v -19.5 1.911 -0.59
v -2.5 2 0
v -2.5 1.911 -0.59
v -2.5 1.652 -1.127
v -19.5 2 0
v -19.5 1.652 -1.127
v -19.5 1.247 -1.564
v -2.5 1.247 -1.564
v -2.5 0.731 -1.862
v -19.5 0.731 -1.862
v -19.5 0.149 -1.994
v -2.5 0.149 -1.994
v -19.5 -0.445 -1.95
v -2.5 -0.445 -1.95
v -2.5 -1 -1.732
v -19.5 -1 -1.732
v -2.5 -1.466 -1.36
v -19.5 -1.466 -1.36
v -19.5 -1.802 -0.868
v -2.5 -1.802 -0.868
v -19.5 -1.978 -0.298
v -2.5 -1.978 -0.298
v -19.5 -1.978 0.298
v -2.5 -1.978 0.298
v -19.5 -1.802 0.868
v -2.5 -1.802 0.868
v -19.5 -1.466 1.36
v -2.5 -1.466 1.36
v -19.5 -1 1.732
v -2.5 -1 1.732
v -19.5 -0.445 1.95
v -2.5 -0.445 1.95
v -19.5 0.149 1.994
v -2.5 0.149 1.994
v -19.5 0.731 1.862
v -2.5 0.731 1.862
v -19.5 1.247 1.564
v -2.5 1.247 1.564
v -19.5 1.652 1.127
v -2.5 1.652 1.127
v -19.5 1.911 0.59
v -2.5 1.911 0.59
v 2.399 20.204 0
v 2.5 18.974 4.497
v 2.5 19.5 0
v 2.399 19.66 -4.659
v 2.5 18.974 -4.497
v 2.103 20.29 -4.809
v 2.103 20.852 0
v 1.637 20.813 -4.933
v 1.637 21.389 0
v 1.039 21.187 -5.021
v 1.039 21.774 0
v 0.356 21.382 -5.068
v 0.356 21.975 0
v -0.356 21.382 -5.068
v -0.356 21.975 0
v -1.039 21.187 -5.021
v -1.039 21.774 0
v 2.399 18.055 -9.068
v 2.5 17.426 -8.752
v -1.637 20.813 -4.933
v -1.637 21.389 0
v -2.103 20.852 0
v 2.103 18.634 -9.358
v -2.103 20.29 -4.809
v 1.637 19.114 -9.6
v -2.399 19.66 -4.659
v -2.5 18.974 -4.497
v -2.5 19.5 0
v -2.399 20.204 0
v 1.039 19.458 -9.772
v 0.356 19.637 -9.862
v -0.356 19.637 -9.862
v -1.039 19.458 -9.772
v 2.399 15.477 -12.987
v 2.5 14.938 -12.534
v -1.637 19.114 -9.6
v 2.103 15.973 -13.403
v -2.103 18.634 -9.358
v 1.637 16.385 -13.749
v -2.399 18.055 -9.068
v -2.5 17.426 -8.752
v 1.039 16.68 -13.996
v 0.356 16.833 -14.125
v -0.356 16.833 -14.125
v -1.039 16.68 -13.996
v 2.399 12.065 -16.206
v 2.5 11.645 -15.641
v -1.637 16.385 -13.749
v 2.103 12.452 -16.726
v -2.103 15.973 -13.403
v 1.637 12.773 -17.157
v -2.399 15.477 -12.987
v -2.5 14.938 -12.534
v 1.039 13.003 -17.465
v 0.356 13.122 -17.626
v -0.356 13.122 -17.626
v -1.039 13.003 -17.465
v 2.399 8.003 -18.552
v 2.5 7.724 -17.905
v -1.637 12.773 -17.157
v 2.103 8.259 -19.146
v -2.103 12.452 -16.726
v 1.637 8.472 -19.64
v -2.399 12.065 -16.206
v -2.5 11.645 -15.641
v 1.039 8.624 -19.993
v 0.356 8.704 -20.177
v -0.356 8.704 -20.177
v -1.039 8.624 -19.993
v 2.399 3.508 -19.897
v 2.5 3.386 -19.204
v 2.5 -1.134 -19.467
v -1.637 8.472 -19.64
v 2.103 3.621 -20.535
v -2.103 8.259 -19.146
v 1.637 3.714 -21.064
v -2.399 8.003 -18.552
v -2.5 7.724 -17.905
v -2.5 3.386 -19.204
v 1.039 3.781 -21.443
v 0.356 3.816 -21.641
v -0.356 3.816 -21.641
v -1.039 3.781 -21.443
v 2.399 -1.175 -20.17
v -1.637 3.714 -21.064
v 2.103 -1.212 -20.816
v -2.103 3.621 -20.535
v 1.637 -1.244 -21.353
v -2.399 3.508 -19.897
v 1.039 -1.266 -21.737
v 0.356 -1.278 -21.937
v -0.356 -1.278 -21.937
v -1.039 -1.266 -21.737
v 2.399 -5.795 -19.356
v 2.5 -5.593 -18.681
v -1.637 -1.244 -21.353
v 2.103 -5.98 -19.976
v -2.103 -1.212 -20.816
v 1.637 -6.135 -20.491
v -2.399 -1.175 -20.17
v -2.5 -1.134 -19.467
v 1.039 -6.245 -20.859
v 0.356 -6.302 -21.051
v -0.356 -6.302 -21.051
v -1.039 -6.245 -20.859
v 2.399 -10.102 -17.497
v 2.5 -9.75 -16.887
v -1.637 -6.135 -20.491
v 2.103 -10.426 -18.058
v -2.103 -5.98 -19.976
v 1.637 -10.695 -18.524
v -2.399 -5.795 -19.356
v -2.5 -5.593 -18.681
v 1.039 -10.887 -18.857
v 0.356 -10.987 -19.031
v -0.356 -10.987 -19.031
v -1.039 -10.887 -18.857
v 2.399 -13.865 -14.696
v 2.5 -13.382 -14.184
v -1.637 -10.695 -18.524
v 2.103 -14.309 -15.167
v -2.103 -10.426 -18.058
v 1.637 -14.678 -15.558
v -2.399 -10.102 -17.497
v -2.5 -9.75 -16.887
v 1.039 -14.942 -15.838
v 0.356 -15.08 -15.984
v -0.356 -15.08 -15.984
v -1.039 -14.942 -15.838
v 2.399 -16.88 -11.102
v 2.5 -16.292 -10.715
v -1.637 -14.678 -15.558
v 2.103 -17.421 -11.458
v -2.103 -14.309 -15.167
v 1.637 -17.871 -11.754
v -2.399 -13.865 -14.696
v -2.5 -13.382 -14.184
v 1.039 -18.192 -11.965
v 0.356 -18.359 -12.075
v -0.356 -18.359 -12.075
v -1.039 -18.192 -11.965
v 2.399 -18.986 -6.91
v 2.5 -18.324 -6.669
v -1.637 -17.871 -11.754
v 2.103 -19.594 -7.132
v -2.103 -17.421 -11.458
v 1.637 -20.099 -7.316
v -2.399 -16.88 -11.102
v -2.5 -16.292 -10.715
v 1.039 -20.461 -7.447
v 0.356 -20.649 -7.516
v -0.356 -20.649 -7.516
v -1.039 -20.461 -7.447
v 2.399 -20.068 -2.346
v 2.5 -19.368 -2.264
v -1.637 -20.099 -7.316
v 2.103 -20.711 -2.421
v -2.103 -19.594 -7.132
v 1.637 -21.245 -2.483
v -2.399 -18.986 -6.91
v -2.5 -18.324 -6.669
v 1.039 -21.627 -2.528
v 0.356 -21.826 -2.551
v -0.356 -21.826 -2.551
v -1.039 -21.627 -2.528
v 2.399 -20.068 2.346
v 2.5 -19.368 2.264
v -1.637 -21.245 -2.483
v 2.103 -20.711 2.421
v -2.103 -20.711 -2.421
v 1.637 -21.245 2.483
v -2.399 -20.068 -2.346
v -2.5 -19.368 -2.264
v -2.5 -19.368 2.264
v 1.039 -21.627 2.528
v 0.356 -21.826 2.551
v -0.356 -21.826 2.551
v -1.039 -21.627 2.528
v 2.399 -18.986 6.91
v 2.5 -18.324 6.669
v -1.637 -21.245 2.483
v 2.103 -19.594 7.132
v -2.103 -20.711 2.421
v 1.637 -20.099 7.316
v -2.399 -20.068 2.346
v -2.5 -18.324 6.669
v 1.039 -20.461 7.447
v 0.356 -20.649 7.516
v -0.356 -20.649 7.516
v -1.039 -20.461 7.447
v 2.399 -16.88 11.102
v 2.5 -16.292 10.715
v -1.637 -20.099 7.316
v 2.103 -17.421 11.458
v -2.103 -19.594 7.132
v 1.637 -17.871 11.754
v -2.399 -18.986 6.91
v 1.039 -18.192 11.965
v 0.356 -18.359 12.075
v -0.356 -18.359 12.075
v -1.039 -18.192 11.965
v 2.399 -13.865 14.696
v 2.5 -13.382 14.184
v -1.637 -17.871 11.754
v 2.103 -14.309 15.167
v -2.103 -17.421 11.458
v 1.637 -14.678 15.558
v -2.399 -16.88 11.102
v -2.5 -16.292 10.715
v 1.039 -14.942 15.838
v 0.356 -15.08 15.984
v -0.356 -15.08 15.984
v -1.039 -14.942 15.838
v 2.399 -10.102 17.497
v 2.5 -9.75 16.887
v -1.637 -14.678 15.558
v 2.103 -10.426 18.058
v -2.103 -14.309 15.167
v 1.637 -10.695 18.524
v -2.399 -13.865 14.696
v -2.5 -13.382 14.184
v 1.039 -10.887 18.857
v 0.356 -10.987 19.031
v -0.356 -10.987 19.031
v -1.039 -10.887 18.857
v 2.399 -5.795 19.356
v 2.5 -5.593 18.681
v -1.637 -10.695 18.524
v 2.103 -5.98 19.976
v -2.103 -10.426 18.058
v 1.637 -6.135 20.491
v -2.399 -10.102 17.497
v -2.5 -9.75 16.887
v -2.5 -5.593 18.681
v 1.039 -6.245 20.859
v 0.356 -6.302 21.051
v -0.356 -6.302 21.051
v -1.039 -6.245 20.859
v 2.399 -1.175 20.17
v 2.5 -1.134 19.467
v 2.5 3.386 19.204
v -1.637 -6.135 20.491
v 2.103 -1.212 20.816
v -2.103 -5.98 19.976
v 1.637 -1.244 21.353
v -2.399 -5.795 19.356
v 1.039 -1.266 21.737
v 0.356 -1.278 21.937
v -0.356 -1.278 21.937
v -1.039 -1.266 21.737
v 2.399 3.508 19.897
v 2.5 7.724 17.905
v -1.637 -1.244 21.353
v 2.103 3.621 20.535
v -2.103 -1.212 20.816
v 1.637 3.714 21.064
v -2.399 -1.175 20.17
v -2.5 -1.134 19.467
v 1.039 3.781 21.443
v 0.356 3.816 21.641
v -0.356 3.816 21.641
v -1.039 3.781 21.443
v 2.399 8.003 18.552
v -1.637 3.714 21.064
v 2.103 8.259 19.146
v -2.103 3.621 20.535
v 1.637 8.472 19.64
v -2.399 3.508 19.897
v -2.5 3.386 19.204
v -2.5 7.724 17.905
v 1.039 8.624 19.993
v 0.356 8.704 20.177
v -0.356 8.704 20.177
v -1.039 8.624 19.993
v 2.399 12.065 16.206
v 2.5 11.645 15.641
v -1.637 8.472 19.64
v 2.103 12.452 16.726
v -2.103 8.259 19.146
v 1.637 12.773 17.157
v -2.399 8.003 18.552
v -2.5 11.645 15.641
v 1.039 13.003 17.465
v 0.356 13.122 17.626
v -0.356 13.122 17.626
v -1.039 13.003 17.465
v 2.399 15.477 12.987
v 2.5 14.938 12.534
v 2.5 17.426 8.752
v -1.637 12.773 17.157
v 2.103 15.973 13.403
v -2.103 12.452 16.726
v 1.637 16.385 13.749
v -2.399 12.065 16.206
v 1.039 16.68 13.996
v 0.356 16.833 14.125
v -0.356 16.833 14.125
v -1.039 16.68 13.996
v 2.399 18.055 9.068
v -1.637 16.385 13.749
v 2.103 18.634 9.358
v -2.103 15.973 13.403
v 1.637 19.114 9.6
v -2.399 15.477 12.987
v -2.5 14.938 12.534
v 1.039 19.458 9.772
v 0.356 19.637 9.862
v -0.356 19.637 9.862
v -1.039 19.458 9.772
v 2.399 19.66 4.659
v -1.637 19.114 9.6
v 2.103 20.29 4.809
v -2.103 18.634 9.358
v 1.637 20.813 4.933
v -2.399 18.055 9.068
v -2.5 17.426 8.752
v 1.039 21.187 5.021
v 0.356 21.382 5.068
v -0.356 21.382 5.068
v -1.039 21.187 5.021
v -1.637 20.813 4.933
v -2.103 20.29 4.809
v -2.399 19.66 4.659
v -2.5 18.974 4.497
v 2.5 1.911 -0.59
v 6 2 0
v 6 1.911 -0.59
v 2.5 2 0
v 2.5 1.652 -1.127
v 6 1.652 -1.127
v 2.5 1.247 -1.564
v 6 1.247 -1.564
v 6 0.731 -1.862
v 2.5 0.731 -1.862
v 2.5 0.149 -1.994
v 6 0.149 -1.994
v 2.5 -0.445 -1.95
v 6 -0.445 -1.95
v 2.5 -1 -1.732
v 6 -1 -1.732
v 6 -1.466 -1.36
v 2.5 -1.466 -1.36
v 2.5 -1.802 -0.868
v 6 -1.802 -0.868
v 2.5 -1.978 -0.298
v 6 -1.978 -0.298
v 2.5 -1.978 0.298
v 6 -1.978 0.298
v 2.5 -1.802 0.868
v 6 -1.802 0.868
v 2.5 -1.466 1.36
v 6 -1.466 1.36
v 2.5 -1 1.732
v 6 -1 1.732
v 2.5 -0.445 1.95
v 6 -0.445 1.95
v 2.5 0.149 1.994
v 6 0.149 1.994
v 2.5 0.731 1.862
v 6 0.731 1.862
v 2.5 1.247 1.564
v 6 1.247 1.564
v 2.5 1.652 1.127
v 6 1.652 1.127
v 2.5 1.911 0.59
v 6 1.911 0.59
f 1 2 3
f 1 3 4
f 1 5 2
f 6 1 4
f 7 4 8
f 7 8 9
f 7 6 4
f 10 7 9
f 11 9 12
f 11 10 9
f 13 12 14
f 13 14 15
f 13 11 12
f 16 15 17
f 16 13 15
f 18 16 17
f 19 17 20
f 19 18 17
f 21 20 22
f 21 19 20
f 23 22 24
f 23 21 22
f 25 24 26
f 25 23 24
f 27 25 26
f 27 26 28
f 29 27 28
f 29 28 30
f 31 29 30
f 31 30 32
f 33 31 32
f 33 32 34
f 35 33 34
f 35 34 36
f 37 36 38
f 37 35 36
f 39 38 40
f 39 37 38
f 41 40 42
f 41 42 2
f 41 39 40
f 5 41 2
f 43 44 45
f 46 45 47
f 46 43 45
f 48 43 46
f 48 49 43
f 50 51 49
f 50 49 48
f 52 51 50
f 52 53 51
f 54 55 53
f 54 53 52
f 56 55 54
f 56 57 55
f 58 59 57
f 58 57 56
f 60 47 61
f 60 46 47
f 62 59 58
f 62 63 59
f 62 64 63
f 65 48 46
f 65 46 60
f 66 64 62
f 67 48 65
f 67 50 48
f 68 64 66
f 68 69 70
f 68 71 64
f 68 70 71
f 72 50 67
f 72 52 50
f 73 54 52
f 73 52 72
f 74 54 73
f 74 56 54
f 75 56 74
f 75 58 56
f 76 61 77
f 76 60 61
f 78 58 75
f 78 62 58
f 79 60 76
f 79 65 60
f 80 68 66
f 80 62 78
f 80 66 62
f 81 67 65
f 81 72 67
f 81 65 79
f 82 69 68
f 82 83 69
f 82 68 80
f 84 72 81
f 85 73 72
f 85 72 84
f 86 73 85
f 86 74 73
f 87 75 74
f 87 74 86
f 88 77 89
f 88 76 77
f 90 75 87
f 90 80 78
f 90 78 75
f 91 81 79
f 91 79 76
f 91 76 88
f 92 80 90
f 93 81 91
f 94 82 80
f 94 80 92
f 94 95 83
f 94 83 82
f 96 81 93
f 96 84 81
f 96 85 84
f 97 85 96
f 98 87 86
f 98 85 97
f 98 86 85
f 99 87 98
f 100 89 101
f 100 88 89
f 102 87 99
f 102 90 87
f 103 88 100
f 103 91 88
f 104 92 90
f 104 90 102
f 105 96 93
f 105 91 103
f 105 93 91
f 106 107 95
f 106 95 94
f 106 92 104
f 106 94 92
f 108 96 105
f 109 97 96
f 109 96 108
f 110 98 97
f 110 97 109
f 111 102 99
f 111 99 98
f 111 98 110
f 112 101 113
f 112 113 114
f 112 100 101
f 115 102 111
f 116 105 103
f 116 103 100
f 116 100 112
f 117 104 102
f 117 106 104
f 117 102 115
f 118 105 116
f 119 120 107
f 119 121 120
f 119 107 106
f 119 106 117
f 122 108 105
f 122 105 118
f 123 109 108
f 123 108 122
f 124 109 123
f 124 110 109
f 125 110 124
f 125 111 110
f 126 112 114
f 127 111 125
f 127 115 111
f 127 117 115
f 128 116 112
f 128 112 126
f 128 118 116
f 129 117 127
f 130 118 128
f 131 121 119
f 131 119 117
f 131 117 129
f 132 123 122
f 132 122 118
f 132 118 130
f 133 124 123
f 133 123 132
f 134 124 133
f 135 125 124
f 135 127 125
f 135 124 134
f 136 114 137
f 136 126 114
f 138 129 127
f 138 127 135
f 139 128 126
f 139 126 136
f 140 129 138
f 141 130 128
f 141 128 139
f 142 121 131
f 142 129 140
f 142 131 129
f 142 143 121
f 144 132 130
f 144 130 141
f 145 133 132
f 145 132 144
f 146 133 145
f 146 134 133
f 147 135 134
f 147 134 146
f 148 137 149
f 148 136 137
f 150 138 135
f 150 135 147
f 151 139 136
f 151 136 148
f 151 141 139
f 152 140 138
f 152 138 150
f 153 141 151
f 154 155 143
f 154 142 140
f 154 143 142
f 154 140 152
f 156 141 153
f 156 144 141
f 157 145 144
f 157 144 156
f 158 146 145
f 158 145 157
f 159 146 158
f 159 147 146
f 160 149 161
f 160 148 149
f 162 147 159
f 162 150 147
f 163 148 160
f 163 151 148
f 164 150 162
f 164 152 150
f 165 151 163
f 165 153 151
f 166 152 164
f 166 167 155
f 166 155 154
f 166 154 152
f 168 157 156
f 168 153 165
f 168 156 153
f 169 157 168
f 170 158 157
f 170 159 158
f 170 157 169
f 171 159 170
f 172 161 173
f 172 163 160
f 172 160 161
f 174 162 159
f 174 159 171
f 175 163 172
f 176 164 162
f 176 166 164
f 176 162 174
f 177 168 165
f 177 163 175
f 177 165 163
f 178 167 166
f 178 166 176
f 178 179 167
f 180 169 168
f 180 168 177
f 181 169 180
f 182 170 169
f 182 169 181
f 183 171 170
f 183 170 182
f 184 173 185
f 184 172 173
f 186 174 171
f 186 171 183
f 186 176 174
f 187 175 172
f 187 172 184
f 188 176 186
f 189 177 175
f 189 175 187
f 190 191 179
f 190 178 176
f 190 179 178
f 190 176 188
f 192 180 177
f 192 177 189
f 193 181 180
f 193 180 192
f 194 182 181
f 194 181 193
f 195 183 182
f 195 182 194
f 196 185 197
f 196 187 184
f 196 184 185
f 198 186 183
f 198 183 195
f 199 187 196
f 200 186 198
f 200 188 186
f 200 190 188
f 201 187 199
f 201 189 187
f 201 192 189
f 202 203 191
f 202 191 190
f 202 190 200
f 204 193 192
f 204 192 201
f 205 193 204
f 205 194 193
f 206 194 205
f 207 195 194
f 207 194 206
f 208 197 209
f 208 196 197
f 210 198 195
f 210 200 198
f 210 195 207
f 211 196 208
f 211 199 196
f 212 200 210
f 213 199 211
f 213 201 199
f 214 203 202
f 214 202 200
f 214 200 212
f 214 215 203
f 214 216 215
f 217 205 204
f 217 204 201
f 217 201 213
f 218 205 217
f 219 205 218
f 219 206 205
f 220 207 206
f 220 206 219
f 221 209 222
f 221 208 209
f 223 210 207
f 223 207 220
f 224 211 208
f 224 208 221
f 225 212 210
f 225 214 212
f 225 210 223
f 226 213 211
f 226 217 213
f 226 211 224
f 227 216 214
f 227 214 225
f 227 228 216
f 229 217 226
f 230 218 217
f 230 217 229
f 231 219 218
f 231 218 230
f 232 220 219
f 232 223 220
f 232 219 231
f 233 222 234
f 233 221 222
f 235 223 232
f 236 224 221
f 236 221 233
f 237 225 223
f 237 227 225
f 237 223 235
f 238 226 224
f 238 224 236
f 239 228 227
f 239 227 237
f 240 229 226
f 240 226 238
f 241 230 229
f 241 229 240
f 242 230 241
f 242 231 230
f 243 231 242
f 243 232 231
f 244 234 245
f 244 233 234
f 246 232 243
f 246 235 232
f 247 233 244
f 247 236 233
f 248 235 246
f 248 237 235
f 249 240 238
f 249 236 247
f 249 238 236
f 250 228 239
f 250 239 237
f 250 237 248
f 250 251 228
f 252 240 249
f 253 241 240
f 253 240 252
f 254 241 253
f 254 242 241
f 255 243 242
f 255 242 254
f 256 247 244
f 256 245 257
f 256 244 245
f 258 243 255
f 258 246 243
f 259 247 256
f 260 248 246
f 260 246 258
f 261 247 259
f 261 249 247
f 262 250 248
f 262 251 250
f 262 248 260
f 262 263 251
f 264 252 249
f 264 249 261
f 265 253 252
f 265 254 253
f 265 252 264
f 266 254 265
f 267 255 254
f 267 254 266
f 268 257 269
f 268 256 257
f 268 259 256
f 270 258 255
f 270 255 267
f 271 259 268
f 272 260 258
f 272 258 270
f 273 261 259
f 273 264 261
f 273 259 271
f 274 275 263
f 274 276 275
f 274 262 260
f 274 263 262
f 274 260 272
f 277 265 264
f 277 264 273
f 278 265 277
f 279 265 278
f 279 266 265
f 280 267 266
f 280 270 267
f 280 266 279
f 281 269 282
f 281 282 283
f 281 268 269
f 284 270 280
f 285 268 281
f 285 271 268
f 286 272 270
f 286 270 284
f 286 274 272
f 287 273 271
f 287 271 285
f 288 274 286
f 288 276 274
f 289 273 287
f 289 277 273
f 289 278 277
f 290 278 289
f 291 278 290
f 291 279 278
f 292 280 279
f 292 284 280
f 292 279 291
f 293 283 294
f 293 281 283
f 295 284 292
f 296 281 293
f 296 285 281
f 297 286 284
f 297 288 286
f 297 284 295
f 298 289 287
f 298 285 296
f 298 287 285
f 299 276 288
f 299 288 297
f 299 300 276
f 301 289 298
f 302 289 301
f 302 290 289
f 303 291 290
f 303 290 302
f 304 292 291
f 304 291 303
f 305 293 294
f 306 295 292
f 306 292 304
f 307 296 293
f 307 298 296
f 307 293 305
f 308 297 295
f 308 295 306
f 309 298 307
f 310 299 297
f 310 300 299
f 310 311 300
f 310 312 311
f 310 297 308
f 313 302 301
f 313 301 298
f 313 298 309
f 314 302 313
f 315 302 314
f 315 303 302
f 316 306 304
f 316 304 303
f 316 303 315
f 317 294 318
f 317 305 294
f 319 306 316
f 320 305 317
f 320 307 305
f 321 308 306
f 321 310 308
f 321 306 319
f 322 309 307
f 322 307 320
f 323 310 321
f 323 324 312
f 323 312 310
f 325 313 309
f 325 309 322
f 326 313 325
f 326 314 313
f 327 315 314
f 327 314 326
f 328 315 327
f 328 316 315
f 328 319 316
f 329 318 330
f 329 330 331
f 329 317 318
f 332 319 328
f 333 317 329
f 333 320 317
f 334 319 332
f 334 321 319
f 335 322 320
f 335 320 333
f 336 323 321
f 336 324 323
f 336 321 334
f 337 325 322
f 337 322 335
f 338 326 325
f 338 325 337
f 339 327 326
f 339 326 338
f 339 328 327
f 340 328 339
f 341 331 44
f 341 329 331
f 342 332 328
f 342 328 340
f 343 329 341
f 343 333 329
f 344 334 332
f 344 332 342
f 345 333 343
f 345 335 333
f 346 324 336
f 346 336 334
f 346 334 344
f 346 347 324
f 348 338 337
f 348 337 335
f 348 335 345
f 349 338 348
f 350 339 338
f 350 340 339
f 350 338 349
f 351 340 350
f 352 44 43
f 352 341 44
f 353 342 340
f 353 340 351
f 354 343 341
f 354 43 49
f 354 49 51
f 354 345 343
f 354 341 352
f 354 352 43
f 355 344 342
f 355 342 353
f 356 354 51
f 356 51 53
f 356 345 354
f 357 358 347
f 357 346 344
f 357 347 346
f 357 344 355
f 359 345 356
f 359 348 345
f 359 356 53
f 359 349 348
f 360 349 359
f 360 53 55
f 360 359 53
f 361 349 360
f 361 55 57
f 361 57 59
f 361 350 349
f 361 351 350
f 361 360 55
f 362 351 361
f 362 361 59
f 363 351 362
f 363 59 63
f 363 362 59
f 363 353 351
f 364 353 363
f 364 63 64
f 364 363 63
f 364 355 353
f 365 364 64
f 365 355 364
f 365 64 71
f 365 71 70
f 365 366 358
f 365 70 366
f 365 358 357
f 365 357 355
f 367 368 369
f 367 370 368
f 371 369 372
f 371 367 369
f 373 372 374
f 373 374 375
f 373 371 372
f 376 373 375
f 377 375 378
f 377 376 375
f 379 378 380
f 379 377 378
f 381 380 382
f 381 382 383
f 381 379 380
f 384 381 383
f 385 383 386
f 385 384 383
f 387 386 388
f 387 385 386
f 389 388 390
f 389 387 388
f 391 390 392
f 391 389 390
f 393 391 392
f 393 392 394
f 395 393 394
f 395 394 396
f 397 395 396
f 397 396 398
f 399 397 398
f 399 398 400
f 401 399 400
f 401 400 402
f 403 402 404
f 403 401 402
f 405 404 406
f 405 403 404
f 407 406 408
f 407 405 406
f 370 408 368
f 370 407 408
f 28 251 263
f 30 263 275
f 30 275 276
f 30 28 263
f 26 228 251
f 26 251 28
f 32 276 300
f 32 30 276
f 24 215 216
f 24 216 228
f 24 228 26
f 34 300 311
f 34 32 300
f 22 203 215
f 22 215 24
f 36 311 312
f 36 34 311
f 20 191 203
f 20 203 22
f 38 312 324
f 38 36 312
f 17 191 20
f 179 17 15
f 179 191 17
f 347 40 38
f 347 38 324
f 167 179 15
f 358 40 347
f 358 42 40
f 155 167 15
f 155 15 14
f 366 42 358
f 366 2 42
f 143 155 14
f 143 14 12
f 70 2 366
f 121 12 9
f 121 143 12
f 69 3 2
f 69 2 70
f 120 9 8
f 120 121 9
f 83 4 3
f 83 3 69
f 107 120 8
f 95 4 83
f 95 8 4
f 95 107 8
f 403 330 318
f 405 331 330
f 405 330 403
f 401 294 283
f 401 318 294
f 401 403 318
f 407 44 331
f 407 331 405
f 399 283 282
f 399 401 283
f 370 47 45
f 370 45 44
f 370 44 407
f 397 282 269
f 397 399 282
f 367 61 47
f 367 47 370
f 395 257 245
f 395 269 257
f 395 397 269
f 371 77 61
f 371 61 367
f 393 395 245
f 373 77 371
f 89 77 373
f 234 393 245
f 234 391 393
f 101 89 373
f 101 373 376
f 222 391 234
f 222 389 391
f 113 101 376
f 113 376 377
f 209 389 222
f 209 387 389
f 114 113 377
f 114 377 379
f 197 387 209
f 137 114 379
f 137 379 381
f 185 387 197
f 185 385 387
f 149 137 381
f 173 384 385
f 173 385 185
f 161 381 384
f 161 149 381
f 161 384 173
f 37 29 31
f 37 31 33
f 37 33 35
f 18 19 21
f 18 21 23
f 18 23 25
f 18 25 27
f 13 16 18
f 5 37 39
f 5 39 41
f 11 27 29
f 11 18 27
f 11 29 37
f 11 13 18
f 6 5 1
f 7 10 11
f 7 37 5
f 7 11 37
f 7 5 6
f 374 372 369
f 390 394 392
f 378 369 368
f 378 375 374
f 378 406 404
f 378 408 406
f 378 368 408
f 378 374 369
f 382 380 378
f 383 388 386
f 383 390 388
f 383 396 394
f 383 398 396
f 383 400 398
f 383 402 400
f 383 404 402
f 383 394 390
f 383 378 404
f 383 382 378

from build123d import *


with BuildPart() as part:
    # Esquisse1 → Révolution1 (revolve)
    with BuildSketch(Plane.XY):
        with BuildLine():
            Line((-2.5, 19.5), (-2.5, 2))
            Line((-2.5, 2), (-19.5, 2))
            Line((-19.5, 2), (-19.5, 0))
            Line((-19.5, 0), (0, 0))
            Line((0, 0), (6, 0))
            Line((6, 0), (6, 2))
            Line((6, 2), (2.5, 2))
            Line((2.5, 2), (2.5, 19.5))
            ThreePointArc((2.5, 19.5), (0, 22), (-2.5, 19.5))
        make_face()
    revolve(axis=Axis((0, 0, 0), (-1, 0, 0)))


solid = part.part
